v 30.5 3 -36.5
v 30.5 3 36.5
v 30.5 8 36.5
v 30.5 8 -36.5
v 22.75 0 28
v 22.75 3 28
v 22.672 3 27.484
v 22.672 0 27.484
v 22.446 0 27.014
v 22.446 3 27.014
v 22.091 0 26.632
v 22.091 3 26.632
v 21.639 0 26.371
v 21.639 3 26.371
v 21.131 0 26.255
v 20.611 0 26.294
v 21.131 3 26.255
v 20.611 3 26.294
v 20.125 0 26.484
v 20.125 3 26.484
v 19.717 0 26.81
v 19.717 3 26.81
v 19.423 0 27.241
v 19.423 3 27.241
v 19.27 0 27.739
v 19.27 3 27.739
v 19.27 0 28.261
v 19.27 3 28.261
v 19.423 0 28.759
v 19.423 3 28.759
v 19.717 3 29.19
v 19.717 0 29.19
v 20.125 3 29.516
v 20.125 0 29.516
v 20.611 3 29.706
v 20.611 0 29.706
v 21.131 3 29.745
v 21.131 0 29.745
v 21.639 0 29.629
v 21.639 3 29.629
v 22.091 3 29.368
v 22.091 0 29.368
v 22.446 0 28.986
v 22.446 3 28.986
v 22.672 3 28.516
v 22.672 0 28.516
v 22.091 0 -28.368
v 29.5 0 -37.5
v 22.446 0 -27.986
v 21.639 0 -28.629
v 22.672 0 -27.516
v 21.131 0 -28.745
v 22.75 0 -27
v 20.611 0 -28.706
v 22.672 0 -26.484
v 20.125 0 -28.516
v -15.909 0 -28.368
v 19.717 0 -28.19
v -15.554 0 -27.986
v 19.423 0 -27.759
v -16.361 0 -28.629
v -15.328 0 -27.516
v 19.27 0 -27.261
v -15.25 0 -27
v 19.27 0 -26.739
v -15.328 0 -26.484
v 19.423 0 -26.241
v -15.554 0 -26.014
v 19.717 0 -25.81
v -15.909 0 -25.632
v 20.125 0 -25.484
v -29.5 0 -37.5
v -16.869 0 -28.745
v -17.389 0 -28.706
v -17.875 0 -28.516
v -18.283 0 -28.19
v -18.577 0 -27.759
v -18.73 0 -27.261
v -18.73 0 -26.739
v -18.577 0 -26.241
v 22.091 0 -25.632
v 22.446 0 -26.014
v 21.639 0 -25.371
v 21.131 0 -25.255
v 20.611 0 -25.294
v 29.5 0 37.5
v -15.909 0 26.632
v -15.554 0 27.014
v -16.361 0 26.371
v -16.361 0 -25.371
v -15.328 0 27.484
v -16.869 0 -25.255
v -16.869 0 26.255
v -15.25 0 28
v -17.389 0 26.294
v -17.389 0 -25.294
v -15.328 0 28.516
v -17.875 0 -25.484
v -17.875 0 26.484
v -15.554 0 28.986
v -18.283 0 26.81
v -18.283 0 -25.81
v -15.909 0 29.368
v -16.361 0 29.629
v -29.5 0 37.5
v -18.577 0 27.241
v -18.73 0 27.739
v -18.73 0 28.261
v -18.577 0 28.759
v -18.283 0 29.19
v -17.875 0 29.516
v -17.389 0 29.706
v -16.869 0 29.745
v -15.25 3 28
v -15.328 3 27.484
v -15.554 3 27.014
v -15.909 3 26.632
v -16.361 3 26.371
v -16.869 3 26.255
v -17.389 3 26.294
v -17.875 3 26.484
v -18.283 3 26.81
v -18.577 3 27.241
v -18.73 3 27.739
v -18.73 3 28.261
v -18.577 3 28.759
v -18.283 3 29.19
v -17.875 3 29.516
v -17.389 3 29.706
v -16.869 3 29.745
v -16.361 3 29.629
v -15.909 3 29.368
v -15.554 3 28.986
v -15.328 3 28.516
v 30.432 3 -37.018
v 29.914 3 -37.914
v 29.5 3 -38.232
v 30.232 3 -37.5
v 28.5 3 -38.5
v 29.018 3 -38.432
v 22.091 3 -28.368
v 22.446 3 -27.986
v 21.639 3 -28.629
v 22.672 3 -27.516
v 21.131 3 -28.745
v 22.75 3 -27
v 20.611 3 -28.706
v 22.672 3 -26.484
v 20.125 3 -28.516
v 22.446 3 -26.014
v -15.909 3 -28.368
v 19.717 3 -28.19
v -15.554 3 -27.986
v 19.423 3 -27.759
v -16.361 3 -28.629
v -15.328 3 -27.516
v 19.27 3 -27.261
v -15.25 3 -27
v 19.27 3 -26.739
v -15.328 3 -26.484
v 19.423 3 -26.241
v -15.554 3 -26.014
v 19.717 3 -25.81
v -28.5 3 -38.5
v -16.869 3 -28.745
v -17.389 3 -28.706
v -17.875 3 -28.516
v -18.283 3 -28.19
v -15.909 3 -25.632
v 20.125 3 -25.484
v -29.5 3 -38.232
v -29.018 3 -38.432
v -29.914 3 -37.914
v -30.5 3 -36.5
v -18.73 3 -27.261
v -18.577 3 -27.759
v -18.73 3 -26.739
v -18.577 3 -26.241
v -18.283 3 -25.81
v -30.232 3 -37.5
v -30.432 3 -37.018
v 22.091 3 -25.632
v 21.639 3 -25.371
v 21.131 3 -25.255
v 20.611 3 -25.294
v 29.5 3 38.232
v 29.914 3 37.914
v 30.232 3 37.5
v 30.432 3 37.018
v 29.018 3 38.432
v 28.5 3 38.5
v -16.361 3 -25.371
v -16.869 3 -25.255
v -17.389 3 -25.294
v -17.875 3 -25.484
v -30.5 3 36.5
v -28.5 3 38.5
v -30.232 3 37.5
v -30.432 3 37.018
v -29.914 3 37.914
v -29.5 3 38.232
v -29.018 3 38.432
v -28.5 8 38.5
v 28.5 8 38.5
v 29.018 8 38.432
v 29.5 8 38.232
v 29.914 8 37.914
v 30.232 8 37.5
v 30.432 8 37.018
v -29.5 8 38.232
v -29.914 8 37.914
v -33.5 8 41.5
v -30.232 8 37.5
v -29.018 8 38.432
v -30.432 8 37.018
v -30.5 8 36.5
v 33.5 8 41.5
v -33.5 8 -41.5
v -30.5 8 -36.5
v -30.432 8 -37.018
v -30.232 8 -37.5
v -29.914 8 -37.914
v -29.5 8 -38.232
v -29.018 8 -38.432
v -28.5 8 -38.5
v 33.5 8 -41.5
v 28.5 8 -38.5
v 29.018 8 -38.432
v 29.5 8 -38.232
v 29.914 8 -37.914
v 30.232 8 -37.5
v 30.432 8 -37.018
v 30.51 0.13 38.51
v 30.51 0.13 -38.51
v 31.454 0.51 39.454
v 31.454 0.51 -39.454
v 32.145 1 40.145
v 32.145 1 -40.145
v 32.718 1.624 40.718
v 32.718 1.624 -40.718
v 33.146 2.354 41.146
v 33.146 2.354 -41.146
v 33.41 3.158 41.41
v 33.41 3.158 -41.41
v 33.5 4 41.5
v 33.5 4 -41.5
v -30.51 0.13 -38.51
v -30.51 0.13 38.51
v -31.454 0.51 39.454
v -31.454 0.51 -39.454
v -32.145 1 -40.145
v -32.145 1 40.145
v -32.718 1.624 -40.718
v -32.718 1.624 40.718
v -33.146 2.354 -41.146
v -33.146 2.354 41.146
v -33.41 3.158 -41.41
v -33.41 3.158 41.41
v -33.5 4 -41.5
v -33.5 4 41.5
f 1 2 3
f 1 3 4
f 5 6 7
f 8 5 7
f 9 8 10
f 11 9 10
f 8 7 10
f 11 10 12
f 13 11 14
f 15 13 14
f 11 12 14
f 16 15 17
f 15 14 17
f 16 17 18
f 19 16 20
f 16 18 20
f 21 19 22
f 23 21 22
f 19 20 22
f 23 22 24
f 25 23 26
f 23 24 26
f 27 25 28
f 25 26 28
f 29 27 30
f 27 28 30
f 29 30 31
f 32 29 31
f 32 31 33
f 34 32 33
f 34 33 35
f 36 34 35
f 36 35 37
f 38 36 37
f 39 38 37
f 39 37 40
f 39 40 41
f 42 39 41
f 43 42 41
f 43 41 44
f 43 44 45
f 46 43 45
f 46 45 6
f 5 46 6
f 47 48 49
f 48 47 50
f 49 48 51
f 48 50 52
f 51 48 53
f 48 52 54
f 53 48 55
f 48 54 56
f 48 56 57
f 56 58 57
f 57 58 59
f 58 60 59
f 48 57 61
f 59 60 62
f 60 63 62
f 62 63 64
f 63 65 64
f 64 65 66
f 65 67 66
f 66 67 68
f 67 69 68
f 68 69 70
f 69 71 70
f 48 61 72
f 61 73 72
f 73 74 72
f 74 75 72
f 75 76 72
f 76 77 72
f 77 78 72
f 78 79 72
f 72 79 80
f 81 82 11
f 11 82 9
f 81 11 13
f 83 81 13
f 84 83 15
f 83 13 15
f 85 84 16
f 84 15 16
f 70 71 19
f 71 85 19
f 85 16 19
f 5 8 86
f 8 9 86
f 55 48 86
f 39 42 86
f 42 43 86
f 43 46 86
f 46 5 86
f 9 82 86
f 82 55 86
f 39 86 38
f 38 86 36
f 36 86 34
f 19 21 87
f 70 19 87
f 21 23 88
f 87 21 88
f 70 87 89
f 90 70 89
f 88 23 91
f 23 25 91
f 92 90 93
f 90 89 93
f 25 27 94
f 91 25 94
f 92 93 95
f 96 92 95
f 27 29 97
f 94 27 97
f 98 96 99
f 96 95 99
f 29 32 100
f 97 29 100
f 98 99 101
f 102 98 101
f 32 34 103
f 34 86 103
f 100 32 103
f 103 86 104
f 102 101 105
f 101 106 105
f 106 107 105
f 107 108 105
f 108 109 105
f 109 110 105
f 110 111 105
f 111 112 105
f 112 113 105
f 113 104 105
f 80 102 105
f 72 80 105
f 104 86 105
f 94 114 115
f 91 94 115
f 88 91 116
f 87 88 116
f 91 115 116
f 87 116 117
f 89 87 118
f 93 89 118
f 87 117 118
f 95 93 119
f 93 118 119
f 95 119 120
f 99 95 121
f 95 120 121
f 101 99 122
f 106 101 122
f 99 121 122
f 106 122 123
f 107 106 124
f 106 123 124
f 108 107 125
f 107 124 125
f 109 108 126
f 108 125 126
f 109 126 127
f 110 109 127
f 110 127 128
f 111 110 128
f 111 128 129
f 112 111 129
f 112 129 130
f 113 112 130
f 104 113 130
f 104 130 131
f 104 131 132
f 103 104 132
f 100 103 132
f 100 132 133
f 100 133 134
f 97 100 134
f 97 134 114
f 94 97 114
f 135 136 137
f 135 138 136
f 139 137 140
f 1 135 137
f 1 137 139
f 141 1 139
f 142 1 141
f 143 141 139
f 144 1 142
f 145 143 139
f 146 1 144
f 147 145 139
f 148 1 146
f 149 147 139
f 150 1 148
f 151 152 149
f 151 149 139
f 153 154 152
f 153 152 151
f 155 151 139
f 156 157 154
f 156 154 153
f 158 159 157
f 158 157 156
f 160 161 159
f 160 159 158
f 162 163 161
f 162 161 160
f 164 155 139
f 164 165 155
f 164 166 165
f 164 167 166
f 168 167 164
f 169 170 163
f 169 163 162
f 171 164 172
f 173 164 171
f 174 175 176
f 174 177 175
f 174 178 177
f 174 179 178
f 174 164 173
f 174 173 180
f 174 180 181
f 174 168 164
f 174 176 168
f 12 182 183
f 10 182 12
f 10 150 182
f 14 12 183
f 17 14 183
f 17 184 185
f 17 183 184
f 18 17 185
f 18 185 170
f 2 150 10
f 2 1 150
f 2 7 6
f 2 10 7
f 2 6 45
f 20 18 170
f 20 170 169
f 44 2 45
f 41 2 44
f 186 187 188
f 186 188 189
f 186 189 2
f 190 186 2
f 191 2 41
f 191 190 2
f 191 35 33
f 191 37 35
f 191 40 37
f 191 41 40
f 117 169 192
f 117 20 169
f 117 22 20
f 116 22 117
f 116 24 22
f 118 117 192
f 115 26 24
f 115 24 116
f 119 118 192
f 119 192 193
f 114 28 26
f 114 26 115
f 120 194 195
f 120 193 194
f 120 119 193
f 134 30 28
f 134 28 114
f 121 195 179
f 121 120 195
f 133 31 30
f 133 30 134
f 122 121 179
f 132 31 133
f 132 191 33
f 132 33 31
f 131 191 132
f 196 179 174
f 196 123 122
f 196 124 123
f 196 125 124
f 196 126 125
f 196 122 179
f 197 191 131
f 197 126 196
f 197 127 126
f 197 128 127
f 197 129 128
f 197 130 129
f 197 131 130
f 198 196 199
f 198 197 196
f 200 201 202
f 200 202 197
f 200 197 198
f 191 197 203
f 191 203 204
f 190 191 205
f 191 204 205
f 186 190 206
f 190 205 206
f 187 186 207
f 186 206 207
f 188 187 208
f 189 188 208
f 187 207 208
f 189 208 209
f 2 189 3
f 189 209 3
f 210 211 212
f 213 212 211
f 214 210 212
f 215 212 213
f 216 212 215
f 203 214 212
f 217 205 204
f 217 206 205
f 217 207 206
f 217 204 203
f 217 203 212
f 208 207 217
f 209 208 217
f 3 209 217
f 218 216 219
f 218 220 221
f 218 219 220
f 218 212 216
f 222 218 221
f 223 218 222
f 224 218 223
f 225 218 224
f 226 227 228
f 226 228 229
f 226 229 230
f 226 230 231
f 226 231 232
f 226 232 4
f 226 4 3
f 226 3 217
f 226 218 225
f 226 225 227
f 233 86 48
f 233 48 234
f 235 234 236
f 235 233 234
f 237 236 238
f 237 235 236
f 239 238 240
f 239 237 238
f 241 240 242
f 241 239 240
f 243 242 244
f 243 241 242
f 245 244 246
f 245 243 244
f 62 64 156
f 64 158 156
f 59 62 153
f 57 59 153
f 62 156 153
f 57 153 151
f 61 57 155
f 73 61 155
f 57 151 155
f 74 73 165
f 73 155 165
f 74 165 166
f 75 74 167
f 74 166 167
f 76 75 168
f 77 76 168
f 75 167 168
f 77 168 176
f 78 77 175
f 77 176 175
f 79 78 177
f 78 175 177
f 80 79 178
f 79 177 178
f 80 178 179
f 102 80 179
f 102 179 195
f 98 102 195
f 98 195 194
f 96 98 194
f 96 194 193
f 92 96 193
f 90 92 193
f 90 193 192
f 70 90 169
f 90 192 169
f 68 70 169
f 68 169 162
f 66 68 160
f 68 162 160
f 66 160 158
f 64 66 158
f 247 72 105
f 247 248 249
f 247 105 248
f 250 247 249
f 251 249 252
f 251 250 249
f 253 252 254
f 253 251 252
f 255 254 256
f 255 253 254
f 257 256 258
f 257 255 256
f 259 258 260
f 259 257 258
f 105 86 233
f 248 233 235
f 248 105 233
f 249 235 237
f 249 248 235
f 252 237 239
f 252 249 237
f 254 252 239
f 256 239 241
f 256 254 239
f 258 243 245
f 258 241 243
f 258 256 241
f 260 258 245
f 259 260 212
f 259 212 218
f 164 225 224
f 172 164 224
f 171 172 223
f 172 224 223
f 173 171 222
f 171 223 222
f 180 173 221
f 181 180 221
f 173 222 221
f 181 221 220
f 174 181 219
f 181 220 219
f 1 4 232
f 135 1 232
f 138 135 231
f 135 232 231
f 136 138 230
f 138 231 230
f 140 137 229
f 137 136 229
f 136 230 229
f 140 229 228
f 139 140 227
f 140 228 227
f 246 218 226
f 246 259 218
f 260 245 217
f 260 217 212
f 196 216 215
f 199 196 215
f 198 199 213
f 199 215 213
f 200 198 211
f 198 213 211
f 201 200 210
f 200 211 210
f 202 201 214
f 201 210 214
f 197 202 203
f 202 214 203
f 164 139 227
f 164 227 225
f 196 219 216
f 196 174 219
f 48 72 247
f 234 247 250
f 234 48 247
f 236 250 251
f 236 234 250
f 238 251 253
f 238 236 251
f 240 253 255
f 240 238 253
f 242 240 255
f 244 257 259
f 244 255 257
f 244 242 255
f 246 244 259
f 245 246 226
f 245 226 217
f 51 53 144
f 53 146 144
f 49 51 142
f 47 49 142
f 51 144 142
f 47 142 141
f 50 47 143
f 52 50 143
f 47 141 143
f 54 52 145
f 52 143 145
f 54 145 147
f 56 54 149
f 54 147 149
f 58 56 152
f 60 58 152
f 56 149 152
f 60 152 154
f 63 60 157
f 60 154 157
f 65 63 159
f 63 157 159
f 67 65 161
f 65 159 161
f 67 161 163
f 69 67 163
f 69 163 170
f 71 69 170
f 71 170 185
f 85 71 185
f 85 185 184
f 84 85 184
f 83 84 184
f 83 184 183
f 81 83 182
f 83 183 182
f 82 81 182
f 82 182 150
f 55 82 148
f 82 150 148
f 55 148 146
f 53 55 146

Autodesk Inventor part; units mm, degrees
ref_plane "YZ Plane" through (0, 0, 0) normal (1, 0, 0) x (0, 1, 0)
ref_plane "XZ Plane" through (0, 0, 0) normal (0, 1, 0) x (-1, 0, 0)
ref_plane "XY Plane" through (0, 0, 0) normal (0, 0, 1) x (1, 0, 0)
sketch "Sketch1" plane through (0, 0, 0) normal (0, 1, 0) x (-1, 0, 0)
  line L0 (-33.5, 41.5) -> (33.5, 41.5)
  line L1 (33.5, 41.5) -> (33.5, -41.5)
  line L2 (33.5, -41.5) -> (-33.5, -41.5)
  line L3 (-33.5, -41.5) -> (-33.5, 41.5)
  line L4 (-33.5, 41.5) -> (33.5, -41.5) construction
  line L5 (33.5, 41.5) -> (-33.5, -41.5) construction
  point P0 (0, 0)
  dimension "d0" = 67
  dimension "d1" = 83
extrude "Extrusion1" add sketch "Sketch1" along normal blind 3
sketch "Sketch2" plane through (0, 3, 0) normal (0, 1, 0) x (1, 0, 0)
  line L0 (-33.5, 41.5) -> (-33.5, -41.5) projected
  line L1 (33.5, 41.5) -> (-33.5, 41.5)
  line L2 (-33.5, 41.5) -> (-33.5, -41.5)
  line L3 (-33.5, -41.5) -> (33.5, -41.5)
  line L4 (33.5, -41.5) -> (33.5, 41.5)
  line L5 (33.5, 41.5) -> (-33.5, -41.5) construction
  line L6 (-33.5, 41.5) -> (33.5, -41.5) construction
  line L7 (30.5, 38.5) -> (-30.5, 38.5)
  line L8 (-30.5, 38.5) -> (-30.5, -38.5)
  line L9 (-30.5, -38.5) -> (30.5, -38.5)
  line L10 (30.5, -38.5) -> (30.5, 38.5)
  line L11 (30.5, 38.5) -> (-30.5, -38.5) construction
  line L12 (-30.5, 38.5) -> (30.5, -38.5) construction
  point P0 (0, 0)
  dimension "d4" = 61
  dimension "d5" = 77
extrude "Extrusion2" add sketch "Sketch2" along normal blind 5
sketch "Sketch3" plane through (0, 3, 0) normal (0, 1, 0) x (1, 0, 0)
  circle A0 centre (21, 27) radius 1.75
  line L0 (-30.5, 38.5) -> (30.5, 38.5) projected
  line L1 (30.5, 38.5) -> (30.5, -38.5) projected
  circle A1 centre (21, -28) radius 1.75
  circle A2 centre (-17, 27) radius 1.75
  circle A3 centre (-17, -28) radius 1.75
  point P0 (0, 0)
  point P1 (30.5, -38.5)
  point P2 (26, 41.5)
  point P3 (26, -41.5)
  dimension "d8" = 3.5
  dimension "d9" = 11.5
  dimension "d10" = 9.5
  dimension "d13" = 55
  dimension "d16" = 38
extrude "Extrusion3" cut sketch "Sketch3" against normal blind 5
fillet "Fillet1" radius 4 4 edges at (33.5, 0, 0) (-33.5, 0, 0) (0, 0, 41.5) (0, 0, -41.5)
fillet "Fillet2" radius 2 4 edges at (-30.5, 5.5, -38.5) (30.5, 5.5, -38.5) (30.5, 5.5, 38.5) (-30.5, 5.5, 38.5)
properties part number "Motor_Node_top"
